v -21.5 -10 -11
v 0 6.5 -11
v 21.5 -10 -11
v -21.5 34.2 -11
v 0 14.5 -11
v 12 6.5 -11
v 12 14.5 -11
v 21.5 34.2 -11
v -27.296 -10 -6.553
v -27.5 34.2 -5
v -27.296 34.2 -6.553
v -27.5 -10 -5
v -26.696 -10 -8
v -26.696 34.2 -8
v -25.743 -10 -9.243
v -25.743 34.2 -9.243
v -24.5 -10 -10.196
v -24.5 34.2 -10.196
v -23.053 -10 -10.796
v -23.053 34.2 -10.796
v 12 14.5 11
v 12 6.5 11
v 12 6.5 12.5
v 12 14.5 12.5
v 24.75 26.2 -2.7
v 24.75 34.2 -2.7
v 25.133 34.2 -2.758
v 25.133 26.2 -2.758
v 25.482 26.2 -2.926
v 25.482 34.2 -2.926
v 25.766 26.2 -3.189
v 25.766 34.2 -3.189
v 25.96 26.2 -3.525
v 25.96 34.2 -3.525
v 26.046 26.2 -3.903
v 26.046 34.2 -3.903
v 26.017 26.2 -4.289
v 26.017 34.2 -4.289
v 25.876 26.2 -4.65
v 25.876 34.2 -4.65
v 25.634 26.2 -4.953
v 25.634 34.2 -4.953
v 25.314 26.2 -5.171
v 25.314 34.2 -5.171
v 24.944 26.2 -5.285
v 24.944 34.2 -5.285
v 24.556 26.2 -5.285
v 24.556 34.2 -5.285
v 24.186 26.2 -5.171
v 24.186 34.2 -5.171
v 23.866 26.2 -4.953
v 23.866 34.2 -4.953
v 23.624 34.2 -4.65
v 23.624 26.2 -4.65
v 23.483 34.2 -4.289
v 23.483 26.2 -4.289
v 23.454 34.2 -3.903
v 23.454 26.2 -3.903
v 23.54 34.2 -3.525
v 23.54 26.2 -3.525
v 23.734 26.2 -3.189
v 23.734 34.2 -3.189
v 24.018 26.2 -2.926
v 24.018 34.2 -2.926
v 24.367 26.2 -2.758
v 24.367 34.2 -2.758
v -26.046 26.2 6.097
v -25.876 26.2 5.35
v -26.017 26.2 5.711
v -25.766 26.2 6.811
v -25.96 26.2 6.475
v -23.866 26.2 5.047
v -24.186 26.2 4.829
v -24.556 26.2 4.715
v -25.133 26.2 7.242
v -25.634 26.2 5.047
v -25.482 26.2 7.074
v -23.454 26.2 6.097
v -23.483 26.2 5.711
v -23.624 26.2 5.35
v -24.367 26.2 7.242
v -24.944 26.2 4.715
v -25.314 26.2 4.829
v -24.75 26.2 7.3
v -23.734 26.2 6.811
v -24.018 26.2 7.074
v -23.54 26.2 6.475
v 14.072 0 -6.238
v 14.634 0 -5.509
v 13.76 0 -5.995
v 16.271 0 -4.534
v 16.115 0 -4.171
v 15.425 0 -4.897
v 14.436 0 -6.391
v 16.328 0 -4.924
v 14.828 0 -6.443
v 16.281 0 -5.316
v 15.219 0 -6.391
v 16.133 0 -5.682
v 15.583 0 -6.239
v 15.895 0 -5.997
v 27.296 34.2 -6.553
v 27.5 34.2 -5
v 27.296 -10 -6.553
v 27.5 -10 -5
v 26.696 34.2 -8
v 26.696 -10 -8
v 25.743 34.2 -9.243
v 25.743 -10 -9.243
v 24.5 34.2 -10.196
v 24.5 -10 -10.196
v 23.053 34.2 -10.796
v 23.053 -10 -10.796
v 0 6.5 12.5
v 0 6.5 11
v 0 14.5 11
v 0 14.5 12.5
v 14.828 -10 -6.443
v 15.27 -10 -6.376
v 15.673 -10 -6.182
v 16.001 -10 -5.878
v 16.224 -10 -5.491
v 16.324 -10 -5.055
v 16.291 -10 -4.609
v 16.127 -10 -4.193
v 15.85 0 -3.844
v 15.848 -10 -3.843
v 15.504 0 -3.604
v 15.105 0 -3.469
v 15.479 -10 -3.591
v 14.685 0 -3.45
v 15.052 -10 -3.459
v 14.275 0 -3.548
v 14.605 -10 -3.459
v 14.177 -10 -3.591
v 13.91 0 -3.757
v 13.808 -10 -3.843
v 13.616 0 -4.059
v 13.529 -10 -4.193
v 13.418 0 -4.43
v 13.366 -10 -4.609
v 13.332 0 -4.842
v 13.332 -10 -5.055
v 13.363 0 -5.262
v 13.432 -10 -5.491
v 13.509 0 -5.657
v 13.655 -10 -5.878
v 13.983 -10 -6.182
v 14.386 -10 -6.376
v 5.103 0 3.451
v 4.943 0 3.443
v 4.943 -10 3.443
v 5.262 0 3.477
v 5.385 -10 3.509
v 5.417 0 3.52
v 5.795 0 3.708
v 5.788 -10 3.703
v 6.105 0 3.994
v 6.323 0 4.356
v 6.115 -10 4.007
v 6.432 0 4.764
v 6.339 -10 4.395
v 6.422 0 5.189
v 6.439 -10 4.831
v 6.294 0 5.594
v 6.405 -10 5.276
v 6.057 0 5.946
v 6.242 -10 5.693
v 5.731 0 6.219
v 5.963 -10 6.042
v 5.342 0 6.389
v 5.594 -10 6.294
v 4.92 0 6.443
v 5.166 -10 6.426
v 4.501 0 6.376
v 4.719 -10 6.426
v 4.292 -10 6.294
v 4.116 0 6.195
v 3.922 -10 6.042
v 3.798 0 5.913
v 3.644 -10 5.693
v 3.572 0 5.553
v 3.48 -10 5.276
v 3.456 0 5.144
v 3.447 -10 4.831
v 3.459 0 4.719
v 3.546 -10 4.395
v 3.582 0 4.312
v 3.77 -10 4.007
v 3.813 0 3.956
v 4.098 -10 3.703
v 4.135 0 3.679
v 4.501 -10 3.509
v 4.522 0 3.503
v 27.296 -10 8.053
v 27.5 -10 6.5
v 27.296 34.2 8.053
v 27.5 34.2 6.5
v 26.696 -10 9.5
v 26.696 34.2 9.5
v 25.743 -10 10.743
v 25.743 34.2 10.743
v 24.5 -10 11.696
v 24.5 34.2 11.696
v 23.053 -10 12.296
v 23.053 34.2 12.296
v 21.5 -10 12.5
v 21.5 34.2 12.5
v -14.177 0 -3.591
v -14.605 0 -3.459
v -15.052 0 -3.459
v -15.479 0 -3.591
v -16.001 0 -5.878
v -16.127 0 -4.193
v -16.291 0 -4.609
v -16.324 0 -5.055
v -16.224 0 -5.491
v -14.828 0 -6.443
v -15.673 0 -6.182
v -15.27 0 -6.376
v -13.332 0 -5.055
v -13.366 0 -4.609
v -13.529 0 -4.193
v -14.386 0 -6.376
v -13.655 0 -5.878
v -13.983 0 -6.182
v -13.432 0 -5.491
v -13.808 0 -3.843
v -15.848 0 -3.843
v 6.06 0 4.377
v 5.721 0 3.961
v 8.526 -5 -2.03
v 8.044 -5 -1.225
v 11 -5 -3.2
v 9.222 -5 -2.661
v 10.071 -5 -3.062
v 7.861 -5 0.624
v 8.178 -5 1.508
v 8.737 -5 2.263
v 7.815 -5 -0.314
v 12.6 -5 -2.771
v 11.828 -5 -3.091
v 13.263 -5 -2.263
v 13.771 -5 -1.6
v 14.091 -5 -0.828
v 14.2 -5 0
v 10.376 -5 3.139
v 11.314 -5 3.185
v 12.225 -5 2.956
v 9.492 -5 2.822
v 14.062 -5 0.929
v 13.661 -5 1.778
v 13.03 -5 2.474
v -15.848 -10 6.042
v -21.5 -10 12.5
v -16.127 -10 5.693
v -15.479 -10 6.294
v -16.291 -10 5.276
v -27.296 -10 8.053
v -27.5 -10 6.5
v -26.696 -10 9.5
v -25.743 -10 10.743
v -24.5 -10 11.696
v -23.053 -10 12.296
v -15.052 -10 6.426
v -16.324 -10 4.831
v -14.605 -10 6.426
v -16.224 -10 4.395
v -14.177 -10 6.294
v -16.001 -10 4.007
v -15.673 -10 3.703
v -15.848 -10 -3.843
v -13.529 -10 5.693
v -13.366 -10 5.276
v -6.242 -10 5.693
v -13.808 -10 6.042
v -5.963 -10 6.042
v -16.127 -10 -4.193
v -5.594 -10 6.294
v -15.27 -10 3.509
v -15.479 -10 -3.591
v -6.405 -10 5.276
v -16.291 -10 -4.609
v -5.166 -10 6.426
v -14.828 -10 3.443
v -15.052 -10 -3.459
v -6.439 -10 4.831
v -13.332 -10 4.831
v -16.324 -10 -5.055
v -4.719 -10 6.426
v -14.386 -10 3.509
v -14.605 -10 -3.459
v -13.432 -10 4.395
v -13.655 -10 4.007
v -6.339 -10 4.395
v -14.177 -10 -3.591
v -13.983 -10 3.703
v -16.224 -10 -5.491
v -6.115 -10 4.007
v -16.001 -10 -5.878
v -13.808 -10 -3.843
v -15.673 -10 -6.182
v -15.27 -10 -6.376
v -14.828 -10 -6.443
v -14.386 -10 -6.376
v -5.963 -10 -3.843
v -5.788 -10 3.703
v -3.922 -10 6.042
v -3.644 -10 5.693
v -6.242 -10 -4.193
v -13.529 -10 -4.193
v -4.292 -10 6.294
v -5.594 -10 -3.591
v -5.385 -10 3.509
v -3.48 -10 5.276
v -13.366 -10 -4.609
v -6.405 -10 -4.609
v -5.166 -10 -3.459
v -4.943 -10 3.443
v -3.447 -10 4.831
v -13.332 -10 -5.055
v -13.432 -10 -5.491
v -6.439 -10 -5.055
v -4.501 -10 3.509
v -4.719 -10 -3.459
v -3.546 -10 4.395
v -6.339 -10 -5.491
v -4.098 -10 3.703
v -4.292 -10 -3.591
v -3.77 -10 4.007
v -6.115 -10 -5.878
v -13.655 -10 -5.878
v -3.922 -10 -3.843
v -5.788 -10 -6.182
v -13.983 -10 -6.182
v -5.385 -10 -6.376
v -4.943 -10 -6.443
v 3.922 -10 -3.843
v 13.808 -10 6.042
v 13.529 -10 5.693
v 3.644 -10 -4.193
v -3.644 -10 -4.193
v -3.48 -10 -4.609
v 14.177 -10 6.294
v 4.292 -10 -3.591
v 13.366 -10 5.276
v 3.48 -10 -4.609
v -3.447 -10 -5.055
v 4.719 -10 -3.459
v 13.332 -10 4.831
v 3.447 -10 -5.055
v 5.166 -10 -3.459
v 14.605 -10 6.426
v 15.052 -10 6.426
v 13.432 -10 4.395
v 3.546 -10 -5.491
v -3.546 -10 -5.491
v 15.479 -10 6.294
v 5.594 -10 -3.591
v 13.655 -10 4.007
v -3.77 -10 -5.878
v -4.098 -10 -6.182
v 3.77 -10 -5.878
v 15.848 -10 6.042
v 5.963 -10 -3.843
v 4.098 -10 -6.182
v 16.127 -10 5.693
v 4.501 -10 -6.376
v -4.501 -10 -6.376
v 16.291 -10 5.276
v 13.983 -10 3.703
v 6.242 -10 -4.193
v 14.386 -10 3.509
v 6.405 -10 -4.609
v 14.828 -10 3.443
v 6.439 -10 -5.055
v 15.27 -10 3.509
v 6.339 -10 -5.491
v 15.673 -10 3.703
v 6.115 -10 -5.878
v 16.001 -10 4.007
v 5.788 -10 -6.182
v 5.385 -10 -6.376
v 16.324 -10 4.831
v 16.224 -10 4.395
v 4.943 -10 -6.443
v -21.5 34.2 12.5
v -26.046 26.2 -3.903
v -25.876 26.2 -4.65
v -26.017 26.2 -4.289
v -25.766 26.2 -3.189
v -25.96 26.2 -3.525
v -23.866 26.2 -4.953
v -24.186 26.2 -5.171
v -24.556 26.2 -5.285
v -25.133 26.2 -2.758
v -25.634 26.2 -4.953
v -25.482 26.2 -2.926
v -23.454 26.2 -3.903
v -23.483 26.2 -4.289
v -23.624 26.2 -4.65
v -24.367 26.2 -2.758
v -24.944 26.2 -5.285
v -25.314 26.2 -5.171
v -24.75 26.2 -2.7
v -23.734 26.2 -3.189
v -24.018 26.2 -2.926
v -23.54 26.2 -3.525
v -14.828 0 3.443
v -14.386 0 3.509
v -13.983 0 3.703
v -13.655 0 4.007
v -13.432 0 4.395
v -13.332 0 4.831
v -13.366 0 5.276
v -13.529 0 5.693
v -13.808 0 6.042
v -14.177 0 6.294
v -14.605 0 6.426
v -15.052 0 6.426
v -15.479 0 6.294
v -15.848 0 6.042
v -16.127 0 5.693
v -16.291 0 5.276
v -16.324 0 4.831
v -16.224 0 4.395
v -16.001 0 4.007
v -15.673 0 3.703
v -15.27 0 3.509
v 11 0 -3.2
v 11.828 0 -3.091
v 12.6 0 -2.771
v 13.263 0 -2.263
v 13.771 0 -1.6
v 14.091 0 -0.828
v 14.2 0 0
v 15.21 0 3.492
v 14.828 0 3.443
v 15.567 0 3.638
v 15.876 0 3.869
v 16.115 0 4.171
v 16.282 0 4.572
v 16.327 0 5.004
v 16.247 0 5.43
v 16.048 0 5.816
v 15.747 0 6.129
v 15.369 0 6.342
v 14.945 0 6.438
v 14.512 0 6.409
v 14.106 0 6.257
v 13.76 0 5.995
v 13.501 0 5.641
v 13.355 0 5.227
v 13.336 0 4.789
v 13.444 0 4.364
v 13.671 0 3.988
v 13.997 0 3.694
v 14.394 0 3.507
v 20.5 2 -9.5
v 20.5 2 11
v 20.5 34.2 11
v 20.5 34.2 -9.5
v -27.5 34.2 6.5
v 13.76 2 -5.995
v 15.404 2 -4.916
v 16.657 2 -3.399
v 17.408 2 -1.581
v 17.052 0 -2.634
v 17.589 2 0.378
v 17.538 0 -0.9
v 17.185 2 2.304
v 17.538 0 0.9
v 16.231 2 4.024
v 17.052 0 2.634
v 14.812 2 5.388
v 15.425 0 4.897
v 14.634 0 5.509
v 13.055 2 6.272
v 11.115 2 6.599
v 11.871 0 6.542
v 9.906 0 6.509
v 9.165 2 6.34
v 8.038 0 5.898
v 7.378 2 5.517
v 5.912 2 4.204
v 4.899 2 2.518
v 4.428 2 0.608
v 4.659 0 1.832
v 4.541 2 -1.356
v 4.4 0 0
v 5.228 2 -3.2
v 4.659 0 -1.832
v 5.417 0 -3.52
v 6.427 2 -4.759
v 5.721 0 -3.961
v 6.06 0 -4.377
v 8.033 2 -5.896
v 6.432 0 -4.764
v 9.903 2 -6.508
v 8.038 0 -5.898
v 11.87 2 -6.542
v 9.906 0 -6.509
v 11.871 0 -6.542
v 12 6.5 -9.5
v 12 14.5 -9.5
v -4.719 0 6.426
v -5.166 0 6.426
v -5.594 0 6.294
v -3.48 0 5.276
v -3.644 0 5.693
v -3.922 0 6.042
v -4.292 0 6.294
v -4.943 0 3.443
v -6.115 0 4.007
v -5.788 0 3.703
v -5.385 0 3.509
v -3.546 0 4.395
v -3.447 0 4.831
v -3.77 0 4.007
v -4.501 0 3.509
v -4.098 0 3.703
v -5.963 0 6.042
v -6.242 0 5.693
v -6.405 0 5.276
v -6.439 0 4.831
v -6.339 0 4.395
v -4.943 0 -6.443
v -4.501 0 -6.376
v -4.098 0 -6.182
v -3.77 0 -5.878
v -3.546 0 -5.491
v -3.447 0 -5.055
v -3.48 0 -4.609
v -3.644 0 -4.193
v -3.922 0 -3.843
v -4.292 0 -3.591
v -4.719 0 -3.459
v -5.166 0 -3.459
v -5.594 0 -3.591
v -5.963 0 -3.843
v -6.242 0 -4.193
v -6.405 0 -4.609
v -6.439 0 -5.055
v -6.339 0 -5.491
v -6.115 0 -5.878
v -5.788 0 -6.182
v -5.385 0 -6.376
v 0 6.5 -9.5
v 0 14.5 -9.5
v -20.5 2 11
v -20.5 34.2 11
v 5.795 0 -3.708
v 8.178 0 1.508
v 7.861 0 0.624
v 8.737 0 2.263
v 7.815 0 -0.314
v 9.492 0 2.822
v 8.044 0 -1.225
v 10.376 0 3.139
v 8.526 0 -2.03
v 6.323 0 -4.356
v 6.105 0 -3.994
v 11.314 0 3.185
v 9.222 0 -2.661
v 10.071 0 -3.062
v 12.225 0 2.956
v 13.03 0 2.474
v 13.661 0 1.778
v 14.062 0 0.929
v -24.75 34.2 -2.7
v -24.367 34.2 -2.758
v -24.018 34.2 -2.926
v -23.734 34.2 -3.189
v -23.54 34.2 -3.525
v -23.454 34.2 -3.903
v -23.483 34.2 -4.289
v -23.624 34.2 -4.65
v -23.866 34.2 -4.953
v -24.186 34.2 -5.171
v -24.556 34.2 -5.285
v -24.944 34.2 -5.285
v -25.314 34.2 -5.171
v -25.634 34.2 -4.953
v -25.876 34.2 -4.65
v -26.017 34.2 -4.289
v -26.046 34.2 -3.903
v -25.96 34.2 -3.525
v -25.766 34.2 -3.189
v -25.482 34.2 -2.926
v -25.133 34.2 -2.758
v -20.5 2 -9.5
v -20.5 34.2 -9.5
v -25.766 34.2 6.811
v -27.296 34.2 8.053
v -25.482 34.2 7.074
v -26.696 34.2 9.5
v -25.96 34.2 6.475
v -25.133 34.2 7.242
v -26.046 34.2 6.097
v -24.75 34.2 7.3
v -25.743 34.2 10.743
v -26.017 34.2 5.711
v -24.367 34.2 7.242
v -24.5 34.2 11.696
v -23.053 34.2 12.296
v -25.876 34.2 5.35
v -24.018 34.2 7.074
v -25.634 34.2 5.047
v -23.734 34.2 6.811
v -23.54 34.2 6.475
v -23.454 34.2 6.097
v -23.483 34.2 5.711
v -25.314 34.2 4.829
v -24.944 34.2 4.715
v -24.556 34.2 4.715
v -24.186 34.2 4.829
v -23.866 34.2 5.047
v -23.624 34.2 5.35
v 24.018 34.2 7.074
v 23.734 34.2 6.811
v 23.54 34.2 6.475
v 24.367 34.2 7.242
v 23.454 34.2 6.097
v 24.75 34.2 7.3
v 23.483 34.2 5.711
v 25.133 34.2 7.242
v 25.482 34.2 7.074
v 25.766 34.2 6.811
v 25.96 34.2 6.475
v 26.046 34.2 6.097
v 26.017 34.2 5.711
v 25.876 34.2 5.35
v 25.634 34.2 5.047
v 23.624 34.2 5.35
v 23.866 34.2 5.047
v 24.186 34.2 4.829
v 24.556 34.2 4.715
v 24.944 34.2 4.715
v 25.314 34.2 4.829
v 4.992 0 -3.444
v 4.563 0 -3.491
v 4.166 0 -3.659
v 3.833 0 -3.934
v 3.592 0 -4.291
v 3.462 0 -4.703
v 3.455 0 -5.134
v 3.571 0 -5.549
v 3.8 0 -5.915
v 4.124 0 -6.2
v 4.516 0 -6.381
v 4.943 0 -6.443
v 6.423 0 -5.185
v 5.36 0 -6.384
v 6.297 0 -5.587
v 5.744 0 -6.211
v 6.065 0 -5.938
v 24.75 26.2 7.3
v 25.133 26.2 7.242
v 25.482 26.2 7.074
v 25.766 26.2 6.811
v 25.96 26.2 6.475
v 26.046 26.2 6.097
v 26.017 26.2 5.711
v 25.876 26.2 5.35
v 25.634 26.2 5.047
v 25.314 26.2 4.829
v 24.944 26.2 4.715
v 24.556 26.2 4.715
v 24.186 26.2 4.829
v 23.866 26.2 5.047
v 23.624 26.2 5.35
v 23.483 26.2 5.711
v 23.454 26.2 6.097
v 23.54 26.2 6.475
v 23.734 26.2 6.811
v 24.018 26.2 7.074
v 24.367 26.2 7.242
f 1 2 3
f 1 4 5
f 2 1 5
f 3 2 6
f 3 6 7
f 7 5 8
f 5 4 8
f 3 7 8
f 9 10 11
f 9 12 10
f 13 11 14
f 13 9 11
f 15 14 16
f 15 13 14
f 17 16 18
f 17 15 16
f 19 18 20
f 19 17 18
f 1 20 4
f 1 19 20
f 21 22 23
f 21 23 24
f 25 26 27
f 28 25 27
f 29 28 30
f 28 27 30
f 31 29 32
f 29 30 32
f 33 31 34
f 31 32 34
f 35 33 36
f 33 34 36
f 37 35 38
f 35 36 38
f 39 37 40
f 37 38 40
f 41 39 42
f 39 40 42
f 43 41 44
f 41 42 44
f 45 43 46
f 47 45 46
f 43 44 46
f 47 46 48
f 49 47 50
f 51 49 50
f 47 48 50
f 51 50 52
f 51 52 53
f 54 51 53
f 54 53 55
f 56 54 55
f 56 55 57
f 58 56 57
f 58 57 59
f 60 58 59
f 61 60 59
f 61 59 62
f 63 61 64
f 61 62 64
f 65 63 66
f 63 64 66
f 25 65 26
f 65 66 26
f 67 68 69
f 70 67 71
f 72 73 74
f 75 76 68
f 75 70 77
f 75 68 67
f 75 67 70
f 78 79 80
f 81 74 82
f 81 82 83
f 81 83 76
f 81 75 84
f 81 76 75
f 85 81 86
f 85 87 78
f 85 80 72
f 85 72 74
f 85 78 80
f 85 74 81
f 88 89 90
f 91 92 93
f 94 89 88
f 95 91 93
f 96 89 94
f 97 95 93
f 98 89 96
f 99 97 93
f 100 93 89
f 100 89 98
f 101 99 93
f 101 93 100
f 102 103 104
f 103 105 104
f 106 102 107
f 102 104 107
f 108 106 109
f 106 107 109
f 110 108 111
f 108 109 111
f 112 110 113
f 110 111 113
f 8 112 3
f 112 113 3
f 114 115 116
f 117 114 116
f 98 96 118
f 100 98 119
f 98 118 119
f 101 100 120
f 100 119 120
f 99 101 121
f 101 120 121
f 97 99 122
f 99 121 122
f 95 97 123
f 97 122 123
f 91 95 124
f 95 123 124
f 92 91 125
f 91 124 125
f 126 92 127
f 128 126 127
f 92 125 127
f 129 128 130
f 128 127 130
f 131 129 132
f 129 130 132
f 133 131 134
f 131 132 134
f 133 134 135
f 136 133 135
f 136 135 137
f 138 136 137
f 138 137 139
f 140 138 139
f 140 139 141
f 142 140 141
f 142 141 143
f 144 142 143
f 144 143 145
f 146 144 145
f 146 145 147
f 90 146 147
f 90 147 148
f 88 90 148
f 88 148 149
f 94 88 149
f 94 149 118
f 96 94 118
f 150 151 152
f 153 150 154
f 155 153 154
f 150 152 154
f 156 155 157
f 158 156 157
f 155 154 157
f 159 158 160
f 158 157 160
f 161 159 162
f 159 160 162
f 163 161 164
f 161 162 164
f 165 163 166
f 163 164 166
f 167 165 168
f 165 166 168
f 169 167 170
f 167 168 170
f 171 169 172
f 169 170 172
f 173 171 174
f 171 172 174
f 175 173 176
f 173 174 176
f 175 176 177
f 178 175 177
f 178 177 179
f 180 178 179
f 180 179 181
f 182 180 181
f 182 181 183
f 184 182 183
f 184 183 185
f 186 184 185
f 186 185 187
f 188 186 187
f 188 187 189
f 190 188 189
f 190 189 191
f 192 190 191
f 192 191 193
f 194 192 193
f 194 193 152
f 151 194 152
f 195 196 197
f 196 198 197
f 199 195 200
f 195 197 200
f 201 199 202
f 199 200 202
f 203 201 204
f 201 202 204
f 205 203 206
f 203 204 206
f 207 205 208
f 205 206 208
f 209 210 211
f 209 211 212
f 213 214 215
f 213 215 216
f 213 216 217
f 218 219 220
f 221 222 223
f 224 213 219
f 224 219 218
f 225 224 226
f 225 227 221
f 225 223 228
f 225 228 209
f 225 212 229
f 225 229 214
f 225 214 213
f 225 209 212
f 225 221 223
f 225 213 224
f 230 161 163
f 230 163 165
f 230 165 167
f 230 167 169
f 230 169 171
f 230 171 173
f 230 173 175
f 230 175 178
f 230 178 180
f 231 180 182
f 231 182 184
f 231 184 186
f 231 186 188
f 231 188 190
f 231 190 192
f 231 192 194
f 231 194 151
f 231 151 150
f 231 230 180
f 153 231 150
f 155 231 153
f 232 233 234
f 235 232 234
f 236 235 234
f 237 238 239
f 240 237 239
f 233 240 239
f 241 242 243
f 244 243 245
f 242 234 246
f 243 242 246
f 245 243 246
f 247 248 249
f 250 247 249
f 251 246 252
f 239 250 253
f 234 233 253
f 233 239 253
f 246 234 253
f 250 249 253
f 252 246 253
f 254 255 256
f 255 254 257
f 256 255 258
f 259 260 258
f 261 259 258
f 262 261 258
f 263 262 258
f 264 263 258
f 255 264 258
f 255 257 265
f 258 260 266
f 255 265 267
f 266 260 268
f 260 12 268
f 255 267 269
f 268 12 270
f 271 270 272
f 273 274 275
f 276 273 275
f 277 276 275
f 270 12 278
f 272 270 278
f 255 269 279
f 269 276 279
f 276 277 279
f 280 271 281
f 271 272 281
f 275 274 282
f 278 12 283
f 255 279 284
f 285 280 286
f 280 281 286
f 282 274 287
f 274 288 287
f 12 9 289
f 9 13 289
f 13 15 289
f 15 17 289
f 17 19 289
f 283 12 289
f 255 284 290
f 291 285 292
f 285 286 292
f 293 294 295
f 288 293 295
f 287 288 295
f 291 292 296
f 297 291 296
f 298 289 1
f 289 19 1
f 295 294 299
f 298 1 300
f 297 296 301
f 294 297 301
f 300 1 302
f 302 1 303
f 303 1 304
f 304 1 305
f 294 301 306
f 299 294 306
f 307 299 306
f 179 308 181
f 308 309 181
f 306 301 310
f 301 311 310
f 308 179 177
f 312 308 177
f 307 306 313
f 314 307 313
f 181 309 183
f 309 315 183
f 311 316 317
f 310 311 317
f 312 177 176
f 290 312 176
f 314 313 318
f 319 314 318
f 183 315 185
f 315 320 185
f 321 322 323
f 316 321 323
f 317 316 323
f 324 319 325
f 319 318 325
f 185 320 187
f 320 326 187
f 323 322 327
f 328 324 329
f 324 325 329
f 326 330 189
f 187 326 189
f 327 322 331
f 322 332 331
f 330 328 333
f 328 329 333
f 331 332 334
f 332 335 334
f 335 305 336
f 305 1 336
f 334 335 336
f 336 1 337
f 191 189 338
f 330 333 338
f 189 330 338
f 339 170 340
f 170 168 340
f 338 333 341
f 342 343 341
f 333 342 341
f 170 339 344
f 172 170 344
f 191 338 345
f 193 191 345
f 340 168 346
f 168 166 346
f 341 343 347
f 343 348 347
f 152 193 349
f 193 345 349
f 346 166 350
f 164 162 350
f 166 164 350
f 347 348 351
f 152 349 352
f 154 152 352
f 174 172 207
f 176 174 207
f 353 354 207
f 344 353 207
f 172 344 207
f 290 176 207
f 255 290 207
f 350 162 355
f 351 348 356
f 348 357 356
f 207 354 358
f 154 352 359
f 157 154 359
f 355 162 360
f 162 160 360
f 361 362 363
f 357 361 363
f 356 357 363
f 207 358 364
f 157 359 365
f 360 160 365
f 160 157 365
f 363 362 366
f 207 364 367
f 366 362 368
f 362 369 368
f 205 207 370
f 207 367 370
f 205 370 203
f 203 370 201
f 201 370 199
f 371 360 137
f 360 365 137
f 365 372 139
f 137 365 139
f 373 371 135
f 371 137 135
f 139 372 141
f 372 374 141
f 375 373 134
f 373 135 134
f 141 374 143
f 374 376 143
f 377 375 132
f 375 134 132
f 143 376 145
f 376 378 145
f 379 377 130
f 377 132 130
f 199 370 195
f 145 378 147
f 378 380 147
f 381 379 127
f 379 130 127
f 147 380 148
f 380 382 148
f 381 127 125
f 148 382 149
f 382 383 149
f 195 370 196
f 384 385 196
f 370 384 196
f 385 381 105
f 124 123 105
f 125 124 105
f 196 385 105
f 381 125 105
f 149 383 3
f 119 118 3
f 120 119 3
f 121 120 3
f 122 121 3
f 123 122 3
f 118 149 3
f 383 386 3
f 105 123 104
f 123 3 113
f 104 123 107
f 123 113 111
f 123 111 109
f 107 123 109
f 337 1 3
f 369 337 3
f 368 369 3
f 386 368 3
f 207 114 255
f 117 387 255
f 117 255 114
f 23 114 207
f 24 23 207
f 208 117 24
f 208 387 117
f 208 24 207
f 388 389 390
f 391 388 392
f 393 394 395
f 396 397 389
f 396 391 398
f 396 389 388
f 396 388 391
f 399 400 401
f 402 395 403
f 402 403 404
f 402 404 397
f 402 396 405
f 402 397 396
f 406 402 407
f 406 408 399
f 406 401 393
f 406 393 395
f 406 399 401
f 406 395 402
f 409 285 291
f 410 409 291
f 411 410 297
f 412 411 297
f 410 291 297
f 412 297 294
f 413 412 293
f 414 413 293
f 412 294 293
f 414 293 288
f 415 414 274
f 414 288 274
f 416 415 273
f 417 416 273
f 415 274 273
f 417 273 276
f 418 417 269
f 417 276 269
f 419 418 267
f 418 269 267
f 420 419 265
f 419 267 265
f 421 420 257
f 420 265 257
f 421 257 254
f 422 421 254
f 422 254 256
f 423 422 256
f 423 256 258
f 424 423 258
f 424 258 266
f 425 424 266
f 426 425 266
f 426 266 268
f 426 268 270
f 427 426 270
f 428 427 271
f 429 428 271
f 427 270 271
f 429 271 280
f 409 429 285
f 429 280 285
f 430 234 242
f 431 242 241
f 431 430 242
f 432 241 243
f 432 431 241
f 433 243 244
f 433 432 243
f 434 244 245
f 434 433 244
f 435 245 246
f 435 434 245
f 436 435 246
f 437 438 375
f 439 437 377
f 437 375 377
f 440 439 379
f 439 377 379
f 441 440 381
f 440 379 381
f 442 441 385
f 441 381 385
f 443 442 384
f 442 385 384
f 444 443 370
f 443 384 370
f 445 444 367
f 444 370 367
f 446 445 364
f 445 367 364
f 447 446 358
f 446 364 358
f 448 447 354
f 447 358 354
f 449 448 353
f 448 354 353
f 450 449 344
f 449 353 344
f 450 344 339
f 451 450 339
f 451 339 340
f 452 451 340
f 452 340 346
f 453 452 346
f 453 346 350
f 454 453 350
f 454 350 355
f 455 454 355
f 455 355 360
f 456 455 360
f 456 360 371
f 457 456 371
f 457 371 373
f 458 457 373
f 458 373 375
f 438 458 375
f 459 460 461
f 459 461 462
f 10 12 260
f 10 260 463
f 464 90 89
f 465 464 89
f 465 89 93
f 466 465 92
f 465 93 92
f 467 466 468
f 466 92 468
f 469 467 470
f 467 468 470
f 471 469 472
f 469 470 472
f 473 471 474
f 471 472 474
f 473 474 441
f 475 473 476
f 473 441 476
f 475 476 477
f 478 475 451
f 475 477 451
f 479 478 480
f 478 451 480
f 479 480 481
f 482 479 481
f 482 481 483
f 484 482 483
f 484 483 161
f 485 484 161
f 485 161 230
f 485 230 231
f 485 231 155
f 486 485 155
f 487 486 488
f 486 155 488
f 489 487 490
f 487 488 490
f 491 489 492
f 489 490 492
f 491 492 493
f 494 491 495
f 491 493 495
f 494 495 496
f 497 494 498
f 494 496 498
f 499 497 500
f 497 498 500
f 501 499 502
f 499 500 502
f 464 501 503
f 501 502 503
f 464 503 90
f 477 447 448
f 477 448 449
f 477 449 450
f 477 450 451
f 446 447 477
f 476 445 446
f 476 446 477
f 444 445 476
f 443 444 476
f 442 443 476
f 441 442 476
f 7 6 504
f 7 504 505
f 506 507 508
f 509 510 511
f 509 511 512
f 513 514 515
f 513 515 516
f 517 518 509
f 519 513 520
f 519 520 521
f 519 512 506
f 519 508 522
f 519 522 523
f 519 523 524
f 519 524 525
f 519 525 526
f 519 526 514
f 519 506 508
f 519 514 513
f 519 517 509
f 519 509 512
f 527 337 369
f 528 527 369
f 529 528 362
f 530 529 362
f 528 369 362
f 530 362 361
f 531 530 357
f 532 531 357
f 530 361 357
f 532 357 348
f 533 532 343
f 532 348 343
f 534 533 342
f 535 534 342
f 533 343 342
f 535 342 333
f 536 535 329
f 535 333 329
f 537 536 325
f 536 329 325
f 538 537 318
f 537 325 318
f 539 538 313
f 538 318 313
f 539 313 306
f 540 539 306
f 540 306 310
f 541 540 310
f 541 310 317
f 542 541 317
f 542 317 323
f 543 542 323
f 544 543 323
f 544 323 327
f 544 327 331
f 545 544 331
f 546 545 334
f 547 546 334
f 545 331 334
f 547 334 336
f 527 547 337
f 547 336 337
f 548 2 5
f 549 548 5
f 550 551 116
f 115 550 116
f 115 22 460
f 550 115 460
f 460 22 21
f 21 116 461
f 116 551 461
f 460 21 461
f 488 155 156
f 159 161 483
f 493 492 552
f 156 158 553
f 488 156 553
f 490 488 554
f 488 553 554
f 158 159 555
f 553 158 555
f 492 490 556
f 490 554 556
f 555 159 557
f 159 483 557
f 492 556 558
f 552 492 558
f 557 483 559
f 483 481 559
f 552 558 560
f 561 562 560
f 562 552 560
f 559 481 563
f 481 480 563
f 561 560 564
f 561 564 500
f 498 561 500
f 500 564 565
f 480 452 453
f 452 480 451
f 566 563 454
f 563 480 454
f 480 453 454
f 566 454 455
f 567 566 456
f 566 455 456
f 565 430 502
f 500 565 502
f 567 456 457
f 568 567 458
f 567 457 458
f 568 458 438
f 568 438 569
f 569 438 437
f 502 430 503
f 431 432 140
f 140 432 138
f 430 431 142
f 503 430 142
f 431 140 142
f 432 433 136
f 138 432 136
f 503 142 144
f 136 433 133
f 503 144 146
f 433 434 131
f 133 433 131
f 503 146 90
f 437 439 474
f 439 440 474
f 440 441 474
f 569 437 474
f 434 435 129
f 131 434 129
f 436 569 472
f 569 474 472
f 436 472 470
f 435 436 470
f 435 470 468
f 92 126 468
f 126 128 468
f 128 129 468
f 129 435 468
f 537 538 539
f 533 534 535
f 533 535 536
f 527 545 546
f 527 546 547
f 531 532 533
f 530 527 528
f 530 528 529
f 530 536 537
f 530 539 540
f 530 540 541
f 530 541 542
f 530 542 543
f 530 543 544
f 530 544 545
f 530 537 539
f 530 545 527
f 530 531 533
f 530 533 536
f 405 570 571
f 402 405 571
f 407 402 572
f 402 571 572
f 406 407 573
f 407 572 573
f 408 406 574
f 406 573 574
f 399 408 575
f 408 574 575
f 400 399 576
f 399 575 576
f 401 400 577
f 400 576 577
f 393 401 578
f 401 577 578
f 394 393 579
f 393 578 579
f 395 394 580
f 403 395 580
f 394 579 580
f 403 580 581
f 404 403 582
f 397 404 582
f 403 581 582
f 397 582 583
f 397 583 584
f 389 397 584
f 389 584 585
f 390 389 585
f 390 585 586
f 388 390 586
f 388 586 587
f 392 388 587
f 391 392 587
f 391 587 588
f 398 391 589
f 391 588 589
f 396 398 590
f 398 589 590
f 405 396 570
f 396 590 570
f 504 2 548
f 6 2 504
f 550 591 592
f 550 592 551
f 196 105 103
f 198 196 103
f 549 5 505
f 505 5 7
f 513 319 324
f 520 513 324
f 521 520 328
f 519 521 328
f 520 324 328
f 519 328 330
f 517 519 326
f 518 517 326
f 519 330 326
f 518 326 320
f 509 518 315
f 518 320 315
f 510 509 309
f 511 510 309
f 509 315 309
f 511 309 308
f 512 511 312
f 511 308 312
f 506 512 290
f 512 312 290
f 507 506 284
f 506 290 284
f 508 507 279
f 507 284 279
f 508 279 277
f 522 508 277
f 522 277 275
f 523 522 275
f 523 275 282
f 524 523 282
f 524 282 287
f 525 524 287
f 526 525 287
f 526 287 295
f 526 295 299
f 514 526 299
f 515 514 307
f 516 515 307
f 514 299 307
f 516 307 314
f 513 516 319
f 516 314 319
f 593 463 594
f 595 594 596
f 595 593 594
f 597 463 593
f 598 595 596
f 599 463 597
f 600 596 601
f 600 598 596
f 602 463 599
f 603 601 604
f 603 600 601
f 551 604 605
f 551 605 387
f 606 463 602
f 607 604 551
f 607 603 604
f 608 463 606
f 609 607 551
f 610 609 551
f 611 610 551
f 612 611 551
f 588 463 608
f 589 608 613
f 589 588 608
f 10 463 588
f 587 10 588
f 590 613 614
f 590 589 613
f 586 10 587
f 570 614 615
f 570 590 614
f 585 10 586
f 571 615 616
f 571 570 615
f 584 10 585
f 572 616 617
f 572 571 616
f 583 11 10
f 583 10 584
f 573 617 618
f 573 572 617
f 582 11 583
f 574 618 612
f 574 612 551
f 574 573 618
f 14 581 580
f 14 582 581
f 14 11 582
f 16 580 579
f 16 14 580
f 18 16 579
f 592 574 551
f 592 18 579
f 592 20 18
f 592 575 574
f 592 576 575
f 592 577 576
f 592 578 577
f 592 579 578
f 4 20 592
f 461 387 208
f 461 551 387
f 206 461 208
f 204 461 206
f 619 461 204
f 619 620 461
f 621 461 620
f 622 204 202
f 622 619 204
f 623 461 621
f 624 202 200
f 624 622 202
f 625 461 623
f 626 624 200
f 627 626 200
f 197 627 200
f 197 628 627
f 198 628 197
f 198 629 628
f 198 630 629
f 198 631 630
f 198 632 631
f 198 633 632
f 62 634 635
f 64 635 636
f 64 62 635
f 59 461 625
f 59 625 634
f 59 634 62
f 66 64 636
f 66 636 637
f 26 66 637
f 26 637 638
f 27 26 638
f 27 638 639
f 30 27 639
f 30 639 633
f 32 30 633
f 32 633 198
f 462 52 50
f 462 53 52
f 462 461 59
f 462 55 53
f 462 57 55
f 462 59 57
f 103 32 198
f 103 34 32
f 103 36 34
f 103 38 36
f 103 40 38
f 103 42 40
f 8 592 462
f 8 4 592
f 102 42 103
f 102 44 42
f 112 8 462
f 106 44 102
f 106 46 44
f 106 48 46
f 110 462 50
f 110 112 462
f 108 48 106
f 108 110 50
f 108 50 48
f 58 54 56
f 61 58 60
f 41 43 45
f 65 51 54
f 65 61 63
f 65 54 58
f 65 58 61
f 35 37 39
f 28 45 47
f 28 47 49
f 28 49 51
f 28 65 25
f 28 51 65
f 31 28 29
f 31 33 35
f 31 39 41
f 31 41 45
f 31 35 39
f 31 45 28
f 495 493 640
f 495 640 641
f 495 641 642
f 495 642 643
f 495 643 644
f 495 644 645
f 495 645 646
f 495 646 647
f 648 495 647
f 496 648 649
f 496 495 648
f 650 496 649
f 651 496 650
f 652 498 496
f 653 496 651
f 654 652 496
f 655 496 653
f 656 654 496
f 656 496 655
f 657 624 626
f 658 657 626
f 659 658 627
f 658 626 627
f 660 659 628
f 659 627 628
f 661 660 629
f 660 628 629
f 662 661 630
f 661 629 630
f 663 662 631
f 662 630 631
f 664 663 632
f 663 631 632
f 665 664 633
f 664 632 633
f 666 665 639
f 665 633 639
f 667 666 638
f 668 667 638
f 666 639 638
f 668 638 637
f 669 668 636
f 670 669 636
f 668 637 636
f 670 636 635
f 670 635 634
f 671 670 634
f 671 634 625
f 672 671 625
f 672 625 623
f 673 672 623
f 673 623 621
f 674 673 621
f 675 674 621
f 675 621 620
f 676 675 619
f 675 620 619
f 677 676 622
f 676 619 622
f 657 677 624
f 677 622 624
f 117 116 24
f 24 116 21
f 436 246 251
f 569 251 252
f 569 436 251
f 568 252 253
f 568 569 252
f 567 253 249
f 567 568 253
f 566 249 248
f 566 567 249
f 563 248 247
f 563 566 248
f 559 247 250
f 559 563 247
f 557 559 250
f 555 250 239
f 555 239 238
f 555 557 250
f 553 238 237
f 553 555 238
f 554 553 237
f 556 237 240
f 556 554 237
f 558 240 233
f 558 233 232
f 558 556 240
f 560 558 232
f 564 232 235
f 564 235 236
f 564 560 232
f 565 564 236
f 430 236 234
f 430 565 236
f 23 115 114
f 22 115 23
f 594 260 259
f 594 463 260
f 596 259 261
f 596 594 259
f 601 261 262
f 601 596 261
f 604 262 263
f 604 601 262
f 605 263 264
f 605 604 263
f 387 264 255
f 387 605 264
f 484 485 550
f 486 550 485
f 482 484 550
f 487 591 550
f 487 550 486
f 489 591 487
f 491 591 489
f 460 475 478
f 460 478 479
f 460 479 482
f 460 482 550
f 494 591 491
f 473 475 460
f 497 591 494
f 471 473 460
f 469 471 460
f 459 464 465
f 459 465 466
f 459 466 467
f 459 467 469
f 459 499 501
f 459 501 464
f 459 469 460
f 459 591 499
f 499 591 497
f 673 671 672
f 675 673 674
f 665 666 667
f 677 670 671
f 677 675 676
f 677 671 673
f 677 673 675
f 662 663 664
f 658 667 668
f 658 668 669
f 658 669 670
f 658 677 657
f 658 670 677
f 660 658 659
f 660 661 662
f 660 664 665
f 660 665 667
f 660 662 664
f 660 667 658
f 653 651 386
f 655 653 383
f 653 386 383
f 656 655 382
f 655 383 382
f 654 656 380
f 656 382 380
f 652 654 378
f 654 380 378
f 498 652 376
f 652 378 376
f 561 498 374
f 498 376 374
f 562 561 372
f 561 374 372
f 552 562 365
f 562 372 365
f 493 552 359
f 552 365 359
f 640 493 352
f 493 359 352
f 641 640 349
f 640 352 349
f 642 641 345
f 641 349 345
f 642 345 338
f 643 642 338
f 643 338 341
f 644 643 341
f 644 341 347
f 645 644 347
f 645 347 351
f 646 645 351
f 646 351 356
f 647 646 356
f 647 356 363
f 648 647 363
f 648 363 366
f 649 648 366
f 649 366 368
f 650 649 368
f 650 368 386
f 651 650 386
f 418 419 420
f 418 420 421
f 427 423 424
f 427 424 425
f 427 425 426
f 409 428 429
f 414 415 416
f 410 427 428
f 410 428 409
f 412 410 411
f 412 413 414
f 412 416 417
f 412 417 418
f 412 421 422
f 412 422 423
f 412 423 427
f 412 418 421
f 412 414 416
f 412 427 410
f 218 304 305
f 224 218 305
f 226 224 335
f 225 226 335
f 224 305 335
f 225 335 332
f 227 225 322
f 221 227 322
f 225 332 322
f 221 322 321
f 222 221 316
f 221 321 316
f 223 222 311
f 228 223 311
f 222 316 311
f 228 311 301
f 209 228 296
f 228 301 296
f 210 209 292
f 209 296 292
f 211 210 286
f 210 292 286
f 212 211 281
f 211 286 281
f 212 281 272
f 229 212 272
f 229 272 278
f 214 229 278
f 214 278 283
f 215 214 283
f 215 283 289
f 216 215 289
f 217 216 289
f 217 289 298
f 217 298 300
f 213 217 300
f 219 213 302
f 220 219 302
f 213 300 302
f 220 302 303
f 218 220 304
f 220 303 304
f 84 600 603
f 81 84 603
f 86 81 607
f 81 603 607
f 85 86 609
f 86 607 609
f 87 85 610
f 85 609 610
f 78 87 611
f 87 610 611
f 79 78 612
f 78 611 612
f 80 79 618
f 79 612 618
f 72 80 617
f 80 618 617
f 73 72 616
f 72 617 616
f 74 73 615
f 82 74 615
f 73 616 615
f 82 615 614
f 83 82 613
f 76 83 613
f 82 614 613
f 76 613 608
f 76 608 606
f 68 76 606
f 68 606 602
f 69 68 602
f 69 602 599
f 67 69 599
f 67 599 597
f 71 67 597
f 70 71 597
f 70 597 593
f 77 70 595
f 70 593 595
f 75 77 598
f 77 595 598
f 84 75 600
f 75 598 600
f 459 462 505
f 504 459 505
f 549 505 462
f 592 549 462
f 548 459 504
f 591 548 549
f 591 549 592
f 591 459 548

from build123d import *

# Parameters (mm, degrees)
SKETCH1_W               = 55
SKETCH1_H               = 22
BOSS_EXTRUDE1_DEPTH     = 2
BOSS_EXTRUDE2_DEPTH     = 32.2
SKETCH5_R               = 1.3
CUT_EXTRUDE2_DEPTH      = 8
SKETCH1_2_W             = 55
SKETCH1_2_H             = 22
BOSS_EXTRUDE3_DEPTH     = 10
SKETCH11_R              = 1.5
CUT_EXTRUDE8_DEPTH      = 10
CUT_EXTRUDE9_DEPTH      = 5
CUT_EXTRUDE9_DEPTH_BACK = 46.242568451
SKETCH8_R               = 3.2
SKETCH8_4_R             = 6.6
CUT_EXTRUDE10_DEPTH     = 10
SKETCH12_W              = 55
SKETCH12_H              = 44.2
BOSS_EXTRUDE4_DEPTH     = 1.5
FILLET1_R               = 6
CUT_EXTRUDE7_DEPTH      = 50.090630471
CUT_EXTRUDE7_DEPTH_BACK = 50.090630471
SKETCH10_W              = 12
SKETCH10_H              = 8


with BuildPart() as part:
    # Sketch1 → Boss-Extrude1 (new body)
    with BuildSketch(Plane(origin=(0, 0, 0), x_dir=(1, 0, 0), z_dir=(0, 1, 0))):
        Rectangle(SKETCH1_W, SKETCH1_H)
    extrude(amount=BOSS_EXTRUDE1_DEPTH)

    # Sketch2 → Boss-Extrude2 (add)
    with BuildSketch(Plane(origin=(0, 2, 0), x_dir=(1, 0, 0), z_dir=(0, 1, 0))):
        Polygon((-27.5, -11), (-27.5, 11), (27.5, 11), (27.5, -11), (20.5, -11), (20.5, 9.5), (-20.5, 9.5), (-20.5, -11), align=None)
    extrude(amount=BOSS_EXTRUDE2_DEPTH)

    # Sketch5 → Cut-Extrude2 (cut)
    with BuildSketch(Plane(origin=(0, 34.2, 0), x_dir=(1, 0, 0), z_dir=(0, 1, 0))):
        with Locations((-24.75, -6)):
            Circle(SKETCH5_R)
        with Locations((-24.75, 4)):
            Circle(SKETCH5_R)
        with Locations((24.75, 4)):
            Circle(SKETCH5_R)
        with Locations((24.75, -6)):
            Circle(SKETCH5_R)
    extrude(amount=-CUT_EXTRUDE2_DEPTH, mode=Mode.SUBTRACT)

    # Sketch1<2> → Boss-Extrude3 (add)
    with BuildSketch(Plane(origin=(0, 0, 0), x_dir=(1, 0, 0), z_dir=(0, 1, 0))):
        Rectangle(SKETCH1_2_W, SKETCH1_2_H)
    extrude(amount=-BOSS_EXTRUDE3_DEPTH)

    # Sketch11 → Cut-Extrude8 (cut)
    with BuildSketch(Plane.XZ.offset(10)):
        with Locations((14.828145062, -4.942715021)):
            Circle(SKETCH11_R)
        with Locations((14.828145062, 4.942715021)):
            Circle(SKETCH11_R)
        with Locations((4.942715021, -4.942715021)):
            Circle(SKETCH11_R)
        with Locations((4.942715021, 4.942715021)):
            Circle(SKETCH11_R)
        with Locations((-4.942715021, -4.942715021)):
            Circle(SKETCH11_R)
        with Locations((-4.942715021, 4.942715021)):
            Circle(SKETCH11_R)
        with Locations((-14.828145062, -4.942715021)):
            Circle(SKETCH11_R)
        with Locations((-14.828145062, 4.942715021)):
            Circle(SKETCH11_R)
    extrude(amount=-CUT_EXTRUDE8_DEPTH, mode=Mode.SUBTRACT)

    # Sketch8 → Cut-Extrude9 (cut, two sides: drawn at the far end of the back side and taken through both)
    with BuildSketch(Plane.XZ.offset(-CUT_EXTRUDE9_DEPTH_BACK)):
        with Locations((11, 0)):
            Circle(SKETCH8_R)
    extrude(amount=CUT_EXTRUDE9_DEPTH + CUT_EXTRUDE9_DEPTH_BACK, mode=Mode.SUBTRACT)

    # Sketch8<4> → Cut-Extrude10 (cut)
    with BuildSketch(Plane.XZ):
        with Locations((11, 0)):
            Circle(SKETCH8_4_R)
    extrude(amount=-CUT_EXTRUDE10_DEPTH, mode=Mode.SUBTRACT)

    # Sketch12 → Boss-Extrude4 (add)
    with BuildSketch(Plane.XY.offset(11)):
        with Locations((0, 12.1)):
            Rectangle(SKETCH12_W, SKETCH12_H)
    extrude(amount=BOSS_EXTRUDE4_DEPTH)

    # Fillet1
    fillet1_edges = [part.edges().sort_by_distance(p)[0] for p in [
        (-27.5, 12.1, 12.5),
        (-27.5, 12.1, -11),
        (27.5, 12.1, 12.5),
        (27.5, 12.1, -11),
    ]]
    fillet(fillet1_edges, radius=FILLET1_R)

    # Sketch10 → Cut-Extrude7 (cut, two sides: drawn at the far end of the back side and taken through both)
    with BuildSketch(Plane.XY.offset(-9.5).offset(-CUT_EXTRUDE7_DEPTH_BACK)):
        with Locations((6, 10.5)):
            Rectangle(SKETCH10_W, SKETCH10_H)
    extrude(amount=CUT_EXTRUDE7_DEPTH + CUT_EXTRUDE7_DEPTH_BACK, mode=Mode.SUBTRACT)


solid = part.part
